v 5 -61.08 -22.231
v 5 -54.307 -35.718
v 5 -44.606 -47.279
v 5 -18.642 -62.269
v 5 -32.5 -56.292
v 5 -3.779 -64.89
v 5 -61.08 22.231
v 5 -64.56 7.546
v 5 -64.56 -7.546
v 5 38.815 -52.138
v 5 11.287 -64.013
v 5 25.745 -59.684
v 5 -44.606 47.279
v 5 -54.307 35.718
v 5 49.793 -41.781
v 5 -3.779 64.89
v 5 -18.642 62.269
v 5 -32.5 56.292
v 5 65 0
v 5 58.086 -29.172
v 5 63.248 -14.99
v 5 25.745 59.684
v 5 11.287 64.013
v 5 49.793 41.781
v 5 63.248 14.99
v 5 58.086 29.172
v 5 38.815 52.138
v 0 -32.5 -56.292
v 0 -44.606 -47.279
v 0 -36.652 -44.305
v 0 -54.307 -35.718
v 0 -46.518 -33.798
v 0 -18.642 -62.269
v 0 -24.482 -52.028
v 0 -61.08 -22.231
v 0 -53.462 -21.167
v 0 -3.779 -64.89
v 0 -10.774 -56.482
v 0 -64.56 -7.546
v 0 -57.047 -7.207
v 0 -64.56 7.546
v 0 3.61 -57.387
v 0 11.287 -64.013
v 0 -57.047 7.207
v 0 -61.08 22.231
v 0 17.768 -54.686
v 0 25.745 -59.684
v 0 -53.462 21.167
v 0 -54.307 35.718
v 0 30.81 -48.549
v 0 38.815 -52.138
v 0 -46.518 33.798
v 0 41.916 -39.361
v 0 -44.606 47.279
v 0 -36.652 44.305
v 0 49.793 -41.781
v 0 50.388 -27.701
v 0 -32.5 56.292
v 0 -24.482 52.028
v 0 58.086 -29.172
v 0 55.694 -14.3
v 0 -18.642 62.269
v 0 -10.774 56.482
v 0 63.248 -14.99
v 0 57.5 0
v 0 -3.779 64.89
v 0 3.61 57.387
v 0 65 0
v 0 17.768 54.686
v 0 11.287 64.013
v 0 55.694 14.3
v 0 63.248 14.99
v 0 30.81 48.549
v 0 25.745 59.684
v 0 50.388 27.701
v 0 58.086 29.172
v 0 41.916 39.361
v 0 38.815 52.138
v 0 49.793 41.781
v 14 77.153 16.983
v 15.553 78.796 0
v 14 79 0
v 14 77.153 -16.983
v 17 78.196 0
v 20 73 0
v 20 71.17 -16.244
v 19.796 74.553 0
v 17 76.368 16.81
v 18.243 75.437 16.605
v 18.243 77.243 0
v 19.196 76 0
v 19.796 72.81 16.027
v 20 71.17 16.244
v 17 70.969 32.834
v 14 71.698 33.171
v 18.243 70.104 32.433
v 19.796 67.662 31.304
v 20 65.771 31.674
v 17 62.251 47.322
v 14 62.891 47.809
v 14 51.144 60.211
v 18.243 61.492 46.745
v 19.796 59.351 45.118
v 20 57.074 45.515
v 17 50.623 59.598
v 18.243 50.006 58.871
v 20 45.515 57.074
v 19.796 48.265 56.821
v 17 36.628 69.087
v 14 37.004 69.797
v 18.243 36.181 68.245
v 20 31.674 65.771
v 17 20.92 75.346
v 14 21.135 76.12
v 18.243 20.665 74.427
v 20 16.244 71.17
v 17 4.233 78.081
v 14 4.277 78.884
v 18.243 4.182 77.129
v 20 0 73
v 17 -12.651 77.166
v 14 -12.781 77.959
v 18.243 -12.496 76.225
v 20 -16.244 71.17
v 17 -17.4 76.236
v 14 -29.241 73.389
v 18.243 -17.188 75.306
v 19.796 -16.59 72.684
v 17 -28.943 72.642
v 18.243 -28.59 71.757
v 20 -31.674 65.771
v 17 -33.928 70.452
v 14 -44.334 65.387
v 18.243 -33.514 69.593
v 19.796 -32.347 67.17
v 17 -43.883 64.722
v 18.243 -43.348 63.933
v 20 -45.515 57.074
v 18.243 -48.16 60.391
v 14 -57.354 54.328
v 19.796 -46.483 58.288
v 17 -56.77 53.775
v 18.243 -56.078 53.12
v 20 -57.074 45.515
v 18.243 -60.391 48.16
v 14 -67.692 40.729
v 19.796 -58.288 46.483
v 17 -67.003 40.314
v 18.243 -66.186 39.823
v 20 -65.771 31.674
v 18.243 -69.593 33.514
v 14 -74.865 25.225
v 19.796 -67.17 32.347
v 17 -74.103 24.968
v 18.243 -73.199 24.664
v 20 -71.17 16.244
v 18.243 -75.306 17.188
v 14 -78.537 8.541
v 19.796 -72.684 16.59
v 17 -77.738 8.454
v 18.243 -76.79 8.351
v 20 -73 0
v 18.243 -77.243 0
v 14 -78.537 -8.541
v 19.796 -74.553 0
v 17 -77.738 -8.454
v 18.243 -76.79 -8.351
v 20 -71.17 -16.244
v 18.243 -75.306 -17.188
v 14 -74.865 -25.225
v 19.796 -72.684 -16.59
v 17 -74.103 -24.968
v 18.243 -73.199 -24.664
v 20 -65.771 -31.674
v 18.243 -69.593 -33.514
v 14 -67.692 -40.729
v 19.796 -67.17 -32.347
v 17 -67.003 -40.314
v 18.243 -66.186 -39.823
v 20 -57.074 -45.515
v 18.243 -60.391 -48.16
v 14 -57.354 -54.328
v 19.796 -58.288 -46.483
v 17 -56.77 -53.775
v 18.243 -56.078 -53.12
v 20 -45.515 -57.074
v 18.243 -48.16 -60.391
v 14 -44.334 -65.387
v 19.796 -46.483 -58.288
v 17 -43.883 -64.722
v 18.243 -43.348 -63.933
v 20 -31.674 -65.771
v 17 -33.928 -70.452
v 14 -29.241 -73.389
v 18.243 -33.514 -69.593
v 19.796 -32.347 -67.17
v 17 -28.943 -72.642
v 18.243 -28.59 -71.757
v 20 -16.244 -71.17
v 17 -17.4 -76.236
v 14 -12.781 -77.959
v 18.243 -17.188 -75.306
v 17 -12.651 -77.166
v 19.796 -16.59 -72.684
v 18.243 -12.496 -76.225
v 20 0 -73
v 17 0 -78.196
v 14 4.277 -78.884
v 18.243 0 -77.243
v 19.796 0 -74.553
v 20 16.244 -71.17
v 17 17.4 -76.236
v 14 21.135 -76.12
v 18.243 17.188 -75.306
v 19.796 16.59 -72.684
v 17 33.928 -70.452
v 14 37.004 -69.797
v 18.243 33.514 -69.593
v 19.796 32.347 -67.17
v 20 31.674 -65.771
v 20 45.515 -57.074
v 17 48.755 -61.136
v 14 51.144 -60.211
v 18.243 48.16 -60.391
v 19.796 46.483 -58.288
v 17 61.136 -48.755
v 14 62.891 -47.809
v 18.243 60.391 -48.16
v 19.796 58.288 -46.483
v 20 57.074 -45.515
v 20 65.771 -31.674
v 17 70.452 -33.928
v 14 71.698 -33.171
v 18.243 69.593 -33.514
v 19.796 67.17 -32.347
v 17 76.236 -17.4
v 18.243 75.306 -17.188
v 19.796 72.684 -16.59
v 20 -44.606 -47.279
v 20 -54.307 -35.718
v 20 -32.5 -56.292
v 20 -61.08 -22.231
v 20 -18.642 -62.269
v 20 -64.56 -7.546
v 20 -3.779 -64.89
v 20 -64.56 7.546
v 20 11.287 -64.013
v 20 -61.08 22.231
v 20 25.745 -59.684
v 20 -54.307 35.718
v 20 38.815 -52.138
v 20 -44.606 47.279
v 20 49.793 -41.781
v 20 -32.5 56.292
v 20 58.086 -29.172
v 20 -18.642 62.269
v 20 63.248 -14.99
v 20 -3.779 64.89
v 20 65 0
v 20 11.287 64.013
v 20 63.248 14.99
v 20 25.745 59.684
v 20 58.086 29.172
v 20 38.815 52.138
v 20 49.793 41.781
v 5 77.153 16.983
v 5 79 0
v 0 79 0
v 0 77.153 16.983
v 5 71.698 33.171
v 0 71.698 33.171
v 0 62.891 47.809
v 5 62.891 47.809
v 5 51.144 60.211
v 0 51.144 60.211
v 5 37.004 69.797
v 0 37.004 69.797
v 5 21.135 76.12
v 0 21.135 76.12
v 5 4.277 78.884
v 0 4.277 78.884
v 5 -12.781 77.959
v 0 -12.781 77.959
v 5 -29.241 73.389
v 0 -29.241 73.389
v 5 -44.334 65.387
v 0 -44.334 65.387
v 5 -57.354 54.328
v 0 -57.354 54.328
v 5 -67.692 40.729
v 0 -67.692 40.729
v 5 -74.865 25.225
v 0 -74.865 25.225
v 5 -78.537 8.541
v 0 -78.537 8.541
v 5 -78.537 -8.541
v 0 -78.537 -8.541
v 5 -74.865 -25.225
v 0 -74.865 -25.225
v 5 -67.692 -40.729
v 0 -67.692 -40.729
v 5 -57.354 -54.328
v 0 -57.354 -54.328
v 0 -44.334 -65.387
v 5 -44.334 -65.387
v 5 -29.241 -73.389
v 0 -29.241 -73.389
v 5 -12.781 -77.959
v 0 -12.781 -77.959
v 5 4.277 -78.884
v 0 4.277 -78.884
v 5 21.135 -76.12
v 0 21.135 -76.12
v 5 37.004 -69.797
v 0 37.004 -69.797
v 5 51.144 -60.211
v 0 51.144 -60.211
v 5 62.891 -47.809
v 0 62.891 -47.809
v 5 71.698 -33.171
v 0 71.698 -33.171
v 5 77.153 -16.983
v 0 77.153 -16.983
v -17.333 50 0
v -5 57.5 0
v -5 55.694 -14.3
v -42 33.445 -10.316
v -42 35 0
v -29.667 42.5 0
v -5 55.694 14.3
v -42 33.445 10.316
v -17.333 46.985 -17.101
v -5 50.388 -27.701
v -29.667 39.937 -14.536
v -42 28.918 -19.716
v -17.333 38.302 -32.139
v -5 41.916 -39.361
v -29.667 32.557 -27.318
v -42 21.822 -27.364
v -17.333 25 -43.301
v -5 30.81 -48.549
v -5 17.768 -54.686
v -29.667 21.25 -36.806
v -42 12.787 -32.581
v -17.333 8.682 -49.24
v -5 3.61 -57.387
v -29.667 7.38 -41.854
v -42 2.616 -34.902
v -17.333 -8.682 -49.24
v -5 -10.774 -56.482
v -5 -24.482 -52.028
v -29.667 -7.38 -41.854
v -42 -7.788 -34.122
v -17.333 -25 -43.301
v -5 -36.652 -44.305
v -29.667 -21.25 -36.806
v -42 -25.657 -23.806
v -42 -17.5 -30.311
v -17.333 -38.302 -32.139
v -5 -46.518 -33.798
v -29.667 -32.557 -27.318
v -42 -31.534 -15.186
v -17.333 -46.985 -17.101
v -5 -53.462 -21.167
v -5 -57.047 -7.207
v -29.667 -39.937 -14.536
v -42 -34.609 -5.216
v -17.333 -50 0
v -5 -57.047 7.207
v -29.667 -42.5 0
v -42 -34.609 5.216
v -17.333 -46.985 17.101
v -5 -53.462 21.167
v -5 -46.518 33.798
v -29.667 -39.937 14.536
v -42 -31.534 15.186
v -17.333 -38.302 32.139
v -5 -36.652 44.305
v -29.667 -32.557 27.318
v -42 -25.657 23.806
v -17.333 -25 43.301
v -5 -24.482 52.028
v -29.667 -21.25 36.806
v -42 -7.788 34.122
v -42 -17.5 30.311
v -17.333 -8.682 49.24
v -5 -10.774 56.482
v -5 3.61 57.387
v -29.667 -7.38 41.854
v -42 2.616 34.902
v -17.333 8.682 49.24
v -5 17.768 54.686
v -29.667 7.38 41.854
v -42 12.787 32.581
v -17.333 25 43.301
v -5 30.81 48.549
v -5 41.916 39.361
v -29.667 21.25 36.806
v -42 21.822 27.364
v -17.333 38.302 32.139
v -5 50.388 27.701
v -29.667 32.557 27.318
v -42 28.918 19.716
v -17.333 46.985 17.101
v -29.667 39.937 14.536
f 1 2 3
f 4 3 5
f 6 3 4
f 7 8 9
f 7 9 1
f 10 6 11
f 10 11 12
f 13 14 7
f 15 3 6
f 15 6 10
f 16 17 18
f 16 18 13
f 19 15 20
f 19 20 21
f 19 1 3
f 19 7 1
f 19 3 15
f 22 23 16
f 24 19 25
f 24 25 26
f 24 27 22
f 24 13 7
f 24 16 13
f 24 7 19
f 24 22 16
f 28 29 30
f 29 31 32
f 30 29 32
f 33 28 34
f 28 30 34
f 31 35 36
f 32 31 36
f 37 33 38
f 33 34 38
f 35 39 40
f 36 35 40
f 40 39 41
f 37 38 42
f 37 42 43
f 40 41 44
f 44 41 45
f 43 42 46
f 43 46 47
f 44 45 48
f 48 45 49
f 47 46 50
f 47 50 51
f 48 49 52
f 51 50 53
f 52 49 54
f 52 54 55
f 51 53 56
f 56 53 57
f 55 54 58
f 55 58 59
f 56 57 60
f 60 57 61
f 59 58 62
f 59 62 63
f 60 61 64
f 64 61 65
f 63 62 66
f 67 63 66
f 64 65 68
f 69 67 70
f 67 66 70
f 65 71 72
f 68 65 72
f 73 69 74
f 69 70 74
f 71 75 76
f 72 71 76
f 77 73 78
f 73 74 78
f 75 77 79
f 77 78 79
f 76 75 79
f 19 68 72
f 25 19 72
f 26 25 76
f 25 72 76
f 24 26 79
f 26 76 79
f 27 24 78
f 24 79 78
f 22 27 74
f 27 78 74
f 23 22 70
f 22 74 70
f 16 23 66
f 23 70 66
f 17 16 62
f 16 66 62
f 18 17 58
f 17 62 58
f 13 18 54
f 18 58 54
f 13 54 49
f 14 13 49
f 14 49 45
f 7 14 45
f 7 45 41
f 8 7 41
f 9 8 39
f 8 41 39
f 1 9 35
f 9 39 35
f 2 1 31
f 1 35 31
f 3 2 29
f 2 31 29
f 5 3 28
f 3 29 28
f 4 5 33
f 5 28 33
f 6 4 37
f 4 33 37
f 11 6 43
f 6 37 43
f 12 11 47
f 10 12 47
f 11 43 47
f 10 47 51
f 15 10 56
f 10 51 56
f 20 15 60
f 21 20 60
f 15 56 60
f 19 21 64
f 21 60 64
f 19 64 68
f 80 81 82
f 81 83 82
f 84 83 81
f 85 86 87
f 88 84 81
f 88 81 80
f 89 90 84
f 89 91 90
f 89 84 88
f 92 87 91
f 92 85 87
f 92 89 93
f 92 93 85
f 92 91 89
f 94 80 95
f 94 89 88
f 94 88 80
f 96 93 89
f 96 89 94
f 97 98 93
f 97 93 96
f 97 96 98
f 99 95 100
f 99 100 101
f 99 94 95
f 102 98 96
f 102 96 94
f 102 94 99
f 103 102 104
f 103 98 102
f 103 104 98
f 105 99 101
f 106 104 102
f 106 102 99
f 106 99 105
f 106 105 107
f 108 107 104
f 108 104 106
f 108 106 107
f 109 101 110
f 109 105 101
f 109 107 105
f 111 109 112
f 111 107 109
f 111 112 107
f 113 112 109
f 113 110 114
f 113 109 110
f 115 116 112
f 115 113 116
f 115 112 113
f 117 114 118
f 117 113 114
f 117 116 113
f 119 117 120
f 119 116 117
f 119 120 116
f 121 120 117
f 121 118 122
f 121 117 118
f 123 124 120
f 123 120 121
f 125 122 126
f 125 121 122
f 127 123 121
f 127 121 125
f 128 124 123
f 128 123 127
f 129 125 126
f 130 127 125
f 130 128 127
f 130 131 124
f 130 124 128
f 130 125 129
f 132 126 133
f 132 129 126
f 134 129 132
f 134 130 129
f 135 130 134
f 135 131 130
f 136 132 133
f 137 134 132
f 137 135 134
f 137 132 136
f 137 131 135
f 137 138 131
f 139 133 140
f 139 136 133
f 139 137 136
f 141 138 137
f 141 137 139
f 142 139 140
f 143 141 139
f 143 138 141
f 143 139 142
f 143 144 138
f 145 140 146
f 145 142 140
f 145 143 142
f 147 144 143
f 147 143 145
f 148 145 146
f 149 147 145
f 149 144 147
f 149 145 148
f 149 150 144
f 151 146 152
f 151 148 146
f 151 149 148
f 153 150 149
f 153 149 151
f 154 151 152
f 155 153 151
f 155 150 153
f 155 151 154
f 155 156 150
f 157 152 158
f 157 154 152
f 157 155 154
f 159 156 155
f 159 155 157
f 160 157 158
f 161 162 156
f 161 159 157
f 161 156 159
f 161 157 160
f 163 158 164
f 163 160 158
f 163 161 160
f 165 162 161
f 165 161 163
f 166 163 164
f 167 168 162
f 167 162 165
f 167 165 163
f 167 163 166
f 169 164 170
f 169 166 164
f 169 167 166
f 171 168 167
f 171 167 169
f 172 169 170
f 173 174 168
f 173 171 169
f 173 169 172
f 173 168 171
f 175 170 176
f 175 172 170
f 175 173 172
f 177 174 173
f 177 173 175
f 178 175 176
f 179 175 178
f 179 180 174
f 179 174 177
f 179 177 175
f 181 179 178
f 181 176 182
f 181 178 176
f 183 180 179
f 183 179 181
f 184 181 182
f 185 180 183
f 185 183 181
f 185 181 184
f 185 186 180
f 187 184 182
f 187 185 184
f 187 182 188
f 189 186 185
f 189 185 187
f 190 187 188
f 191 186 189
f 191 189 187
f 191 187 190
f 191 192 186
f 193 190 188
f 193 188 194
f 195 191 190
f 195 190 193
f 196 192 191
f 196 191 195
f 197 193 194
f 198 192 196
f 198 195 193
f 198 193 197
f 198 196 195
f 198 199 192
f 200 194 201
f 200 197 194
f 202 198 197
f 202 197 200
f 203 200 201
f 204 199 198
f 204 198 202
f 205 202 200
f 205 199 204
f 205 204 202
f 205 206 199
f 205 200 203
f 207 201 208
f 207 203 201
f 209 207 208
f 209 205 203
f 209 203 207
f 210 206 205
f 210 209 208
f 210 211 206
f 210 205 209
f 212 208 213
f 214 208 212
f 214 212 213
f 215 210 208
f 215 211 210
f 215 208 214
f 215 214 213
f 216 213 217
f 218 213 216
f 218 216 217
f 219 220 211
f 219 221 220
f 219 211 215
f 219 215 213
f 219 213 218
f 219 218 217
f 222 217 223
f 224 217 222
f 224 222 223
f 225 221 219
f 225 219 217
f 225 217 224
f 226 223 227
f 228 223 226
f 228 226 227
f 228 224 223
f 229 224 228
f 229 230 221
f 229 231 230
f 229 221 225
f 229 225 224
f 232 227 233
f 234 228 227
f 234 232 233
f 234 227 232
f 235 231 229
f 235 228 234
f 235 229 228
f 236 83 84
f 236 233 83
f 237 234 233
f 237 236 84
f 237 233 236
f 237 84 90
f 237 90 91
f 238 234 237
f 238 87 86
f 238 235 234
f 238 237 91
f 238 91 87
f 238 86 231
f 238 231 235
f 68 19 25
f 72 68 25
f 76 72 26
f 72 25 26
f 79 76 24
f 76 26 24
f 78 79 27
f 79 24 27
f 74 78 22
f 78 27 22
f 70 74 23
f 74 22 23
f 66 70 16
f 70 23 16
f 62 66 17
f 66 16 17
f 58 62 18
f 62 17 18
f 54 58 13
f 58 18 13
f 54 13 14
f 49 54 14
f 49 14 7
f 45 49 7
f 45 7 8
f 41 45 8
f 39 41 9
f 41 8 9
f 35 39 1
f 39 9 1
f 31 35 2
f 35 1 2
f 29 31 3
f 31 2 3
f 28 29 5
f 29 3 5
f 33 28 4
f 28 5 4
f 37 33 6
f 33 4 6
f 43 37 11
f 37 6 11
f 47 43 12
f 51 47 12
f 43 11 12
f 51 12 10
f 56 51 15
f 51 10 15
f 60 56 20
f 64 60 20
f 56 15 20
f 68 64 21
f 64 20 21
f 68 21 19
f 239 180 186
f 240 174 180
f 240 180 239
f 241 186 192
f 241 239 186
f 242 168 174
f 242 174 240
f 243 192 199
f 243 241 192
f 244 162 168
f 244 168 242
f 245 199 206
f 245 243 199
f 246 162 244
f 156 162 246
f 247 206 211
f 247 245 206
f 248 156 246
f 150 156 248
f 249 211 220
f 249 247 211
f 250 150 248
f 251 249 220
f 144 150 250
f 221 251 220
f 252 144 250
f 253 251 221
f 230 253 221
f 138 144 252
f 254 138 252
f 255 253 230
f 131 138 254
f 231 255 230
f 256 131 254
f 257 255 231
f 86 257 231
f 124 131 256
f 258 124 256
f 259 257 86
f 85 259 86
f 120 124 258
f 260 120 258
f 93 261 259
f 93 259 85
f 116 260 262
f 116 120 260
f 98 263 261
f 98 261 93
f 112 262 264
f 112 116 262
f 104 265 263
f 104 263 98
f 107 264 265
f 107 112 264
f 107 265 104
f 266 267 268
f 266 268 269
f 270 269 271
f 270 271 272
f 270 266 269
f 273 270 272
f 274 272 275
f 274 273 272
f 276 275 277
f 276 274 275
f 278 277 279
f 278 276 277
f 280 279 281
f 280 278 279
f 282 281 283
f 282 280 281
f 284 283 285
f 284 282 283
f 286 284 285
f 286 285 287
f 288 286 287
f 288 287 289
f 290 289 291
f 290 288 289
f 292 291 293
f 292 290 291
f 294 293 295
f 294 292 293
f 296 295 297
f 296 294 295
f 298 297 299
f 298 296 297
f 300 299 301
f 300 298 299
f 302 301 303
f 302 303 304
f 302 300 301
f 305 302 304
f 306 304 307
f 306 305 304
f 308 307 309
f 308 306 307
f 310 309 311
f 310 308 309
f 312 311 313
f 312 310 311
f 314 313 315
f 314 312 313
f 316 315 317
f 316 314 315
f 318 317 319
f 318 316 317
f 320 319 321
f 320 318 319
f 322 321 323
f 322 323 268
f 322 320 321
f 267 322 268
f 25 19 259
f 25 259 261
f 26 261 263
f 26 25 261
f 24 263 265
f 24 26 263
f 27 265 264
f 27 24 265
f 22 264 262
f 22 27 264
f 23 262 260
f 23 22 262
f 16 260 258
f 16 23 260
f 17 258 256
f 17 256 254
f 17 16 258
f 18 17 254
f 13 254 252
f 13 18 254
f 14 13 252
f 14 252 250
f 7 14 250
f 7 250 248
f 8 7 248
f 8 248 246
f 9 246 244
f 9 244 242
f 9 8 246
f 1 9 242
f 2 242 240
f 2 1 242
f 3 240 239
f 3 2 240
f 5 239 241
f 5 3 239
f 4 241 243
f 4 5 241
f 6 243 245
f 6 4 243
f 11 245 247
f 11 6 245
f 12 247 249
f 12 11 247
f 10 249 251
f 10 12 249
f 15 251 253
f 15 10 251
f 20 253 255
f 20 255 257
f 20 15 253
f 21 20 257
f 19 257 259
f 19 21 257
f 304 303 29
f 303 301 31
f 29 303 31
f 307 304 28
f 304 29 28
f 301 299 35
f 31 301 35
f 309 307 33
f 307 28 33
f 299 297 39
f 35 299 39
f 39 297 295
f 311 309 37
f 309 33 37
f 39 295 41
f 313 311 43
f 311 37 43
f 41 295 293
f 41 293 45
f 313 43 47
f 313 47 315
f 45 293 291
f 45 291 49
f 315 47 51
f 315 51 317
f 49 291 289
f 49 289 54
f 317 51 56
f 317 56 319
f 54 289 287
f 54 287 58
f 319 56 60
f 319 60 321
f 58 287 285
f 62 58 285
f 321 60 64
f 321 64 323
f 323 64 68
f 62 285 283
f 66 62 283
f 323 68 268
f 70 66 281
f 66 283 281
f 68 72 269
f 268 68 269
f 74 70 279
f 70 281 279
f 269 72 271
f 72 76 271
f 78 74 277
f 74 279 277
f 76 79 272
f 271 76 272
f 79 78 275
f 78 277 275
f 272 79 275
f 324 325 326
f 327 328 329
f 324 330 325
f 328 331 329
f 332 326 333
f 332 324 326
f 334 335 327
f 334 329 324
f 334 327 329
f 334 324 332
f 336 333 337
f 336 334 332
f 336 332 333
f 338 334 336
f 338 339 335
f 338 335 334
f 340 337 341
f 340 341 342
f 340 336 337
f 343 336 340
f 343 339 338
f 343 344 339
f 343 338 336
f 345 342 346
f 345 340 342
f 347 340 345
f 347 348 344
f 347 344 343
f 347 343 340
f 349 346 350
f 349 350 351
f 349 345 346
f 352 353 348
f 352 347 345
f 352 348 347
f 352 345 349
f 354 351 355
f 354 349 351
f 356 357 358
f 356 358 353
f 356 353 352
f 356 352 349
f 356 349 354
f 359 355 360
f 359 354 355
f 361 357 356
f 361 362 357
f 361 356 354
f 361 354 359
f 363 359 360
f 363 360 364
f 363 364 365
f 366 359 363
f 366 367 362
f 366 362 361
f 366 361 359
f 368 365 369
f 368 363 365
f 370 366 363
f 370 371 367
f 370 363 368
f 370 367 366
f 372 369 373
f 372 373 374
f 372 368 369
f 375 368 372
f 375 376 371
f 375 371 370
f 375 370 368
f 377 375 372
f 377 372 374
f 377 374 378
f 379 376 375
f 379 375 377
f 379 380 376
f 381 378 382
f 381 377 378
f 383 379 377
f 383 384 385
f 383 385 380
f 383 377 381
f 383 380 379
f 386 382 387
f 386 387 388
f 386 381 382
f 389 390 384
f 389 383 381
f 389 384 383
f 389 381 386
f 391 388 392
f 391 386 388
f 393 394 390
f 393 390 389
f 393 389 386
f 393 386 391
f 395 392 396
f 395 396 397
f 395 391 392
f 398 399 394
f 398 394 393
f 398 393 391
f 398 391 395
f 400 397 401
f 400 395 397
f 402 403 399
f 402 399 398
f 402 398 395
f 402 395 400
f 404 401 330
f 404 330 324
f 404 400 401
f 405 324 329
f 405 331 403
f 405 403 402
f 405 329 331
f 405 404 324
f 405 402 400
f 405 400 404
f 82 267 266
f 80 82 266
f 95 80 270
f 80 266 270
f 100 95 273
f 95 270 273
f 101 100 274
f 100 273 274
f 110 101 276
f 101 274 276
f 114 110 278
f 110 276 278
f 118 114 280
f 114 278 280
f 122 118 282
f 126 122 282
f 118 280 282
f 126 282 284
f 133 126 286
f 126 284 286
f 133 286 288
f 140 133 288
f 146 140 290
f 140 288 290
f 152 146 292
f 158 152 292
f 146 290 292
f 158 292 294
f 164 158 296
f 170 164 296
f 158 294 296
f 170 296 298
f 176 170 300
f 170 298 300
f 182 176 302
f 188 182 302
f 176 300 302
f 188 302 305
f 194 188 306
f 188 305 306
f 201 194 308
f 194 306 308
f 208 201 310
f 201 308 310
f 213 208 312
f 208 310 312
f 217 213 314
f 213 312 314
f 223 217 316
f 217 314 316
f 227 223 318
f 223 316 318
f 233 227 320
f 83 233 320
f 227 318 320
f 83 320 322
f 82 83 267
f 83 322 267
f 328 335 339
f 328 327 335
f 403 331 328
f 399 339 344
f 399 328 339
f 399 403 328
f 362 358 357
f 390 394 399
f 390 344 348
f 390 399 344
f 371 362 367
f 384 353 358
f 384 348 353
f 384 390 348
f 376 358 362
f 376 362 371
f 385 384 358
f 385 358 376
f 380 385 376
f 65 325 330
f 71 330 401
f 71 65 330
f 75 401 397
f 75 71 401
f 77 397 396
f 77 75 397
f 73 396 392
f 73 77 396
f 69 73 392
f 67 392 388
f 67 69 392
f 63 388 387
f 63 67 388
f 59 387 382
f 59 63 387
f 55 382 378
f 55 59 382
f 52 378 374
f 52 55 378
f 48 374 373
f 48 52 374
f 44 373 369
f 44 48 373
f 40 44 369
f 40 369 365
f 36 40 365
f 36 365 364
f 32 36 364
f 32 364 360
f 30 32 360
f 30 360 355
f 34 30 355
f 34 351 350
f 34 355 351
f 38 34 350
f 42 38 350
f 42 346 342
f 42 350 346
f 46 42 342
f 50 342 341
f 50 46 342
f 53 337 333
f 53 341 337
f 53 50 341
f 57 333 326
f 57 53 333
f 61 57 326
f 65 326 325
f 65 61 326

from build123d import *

# Parameters (mm, degrees)
F0_R      = 65
F1_DEPTH  = 5
F2_R      = 57.5
F3_DEPTH  = 5
F3_FACE_R = 57.5
F5_R      = 35
F7_R      = 79
F7_R_2    = 65
F8_DEPTH  = 5
F9_DEPTH  = 15
F10_R     = 6


with BuildPart() as f1:
    # F0 (on Right) → F1 (new body)
    with BuildSketch(Plane.YZ):
        Circle(F0_R)
    extrude(amount=F1_DEPTH)

    # F2 (on Right) → F3 (join)
    with BuildSketch(Plane.YZ):
        Circle(F2_R)
    extrude(amount=-F3_DEPTH)

    # F3_face (on face) → F6 section 0
    with BuildSketch(Plane(origin=(-5, 0, 0), x_dir=(0, 1, 0), z_dir=(-1, 0, 0))):
        Circle(F3_FACE_R)
    # F5 (on offset) → F6 section 1
    with BuildSketch(Plane(origin=(-42, 0, 0), x_dir=(0, -1, 0), z_dir=(-1, 0, 0))):
        Circle(F5_R)
    loft()


with BuildPart() as f8:
    # F7 (on face) → F8 (new body)
    with BuildSketch(Plane.YZ.offset(5)):
        Circle(F7_R)
        Circle(F7_R_2, mode=Mode.SUBTRACT)
    extrude(amount=-F8_DEPTH)

    # F9 (add): a face of the model
    f9_faces = [f8.faces().sort_by_distance(p)[0] for p in [
        (5, -76.7655425715, 0),
    ]]
    extrude(f9_faces, amount=F9_DEPTH)

    # F10
    f10_edges = [f8.edges().sort_by_distance(p)[0] for p in [
        (20, -79, 0),
    ]]
    fillet(f10_edges, radius=F10_R)


solid = Compound([f1.part, f8.part])
